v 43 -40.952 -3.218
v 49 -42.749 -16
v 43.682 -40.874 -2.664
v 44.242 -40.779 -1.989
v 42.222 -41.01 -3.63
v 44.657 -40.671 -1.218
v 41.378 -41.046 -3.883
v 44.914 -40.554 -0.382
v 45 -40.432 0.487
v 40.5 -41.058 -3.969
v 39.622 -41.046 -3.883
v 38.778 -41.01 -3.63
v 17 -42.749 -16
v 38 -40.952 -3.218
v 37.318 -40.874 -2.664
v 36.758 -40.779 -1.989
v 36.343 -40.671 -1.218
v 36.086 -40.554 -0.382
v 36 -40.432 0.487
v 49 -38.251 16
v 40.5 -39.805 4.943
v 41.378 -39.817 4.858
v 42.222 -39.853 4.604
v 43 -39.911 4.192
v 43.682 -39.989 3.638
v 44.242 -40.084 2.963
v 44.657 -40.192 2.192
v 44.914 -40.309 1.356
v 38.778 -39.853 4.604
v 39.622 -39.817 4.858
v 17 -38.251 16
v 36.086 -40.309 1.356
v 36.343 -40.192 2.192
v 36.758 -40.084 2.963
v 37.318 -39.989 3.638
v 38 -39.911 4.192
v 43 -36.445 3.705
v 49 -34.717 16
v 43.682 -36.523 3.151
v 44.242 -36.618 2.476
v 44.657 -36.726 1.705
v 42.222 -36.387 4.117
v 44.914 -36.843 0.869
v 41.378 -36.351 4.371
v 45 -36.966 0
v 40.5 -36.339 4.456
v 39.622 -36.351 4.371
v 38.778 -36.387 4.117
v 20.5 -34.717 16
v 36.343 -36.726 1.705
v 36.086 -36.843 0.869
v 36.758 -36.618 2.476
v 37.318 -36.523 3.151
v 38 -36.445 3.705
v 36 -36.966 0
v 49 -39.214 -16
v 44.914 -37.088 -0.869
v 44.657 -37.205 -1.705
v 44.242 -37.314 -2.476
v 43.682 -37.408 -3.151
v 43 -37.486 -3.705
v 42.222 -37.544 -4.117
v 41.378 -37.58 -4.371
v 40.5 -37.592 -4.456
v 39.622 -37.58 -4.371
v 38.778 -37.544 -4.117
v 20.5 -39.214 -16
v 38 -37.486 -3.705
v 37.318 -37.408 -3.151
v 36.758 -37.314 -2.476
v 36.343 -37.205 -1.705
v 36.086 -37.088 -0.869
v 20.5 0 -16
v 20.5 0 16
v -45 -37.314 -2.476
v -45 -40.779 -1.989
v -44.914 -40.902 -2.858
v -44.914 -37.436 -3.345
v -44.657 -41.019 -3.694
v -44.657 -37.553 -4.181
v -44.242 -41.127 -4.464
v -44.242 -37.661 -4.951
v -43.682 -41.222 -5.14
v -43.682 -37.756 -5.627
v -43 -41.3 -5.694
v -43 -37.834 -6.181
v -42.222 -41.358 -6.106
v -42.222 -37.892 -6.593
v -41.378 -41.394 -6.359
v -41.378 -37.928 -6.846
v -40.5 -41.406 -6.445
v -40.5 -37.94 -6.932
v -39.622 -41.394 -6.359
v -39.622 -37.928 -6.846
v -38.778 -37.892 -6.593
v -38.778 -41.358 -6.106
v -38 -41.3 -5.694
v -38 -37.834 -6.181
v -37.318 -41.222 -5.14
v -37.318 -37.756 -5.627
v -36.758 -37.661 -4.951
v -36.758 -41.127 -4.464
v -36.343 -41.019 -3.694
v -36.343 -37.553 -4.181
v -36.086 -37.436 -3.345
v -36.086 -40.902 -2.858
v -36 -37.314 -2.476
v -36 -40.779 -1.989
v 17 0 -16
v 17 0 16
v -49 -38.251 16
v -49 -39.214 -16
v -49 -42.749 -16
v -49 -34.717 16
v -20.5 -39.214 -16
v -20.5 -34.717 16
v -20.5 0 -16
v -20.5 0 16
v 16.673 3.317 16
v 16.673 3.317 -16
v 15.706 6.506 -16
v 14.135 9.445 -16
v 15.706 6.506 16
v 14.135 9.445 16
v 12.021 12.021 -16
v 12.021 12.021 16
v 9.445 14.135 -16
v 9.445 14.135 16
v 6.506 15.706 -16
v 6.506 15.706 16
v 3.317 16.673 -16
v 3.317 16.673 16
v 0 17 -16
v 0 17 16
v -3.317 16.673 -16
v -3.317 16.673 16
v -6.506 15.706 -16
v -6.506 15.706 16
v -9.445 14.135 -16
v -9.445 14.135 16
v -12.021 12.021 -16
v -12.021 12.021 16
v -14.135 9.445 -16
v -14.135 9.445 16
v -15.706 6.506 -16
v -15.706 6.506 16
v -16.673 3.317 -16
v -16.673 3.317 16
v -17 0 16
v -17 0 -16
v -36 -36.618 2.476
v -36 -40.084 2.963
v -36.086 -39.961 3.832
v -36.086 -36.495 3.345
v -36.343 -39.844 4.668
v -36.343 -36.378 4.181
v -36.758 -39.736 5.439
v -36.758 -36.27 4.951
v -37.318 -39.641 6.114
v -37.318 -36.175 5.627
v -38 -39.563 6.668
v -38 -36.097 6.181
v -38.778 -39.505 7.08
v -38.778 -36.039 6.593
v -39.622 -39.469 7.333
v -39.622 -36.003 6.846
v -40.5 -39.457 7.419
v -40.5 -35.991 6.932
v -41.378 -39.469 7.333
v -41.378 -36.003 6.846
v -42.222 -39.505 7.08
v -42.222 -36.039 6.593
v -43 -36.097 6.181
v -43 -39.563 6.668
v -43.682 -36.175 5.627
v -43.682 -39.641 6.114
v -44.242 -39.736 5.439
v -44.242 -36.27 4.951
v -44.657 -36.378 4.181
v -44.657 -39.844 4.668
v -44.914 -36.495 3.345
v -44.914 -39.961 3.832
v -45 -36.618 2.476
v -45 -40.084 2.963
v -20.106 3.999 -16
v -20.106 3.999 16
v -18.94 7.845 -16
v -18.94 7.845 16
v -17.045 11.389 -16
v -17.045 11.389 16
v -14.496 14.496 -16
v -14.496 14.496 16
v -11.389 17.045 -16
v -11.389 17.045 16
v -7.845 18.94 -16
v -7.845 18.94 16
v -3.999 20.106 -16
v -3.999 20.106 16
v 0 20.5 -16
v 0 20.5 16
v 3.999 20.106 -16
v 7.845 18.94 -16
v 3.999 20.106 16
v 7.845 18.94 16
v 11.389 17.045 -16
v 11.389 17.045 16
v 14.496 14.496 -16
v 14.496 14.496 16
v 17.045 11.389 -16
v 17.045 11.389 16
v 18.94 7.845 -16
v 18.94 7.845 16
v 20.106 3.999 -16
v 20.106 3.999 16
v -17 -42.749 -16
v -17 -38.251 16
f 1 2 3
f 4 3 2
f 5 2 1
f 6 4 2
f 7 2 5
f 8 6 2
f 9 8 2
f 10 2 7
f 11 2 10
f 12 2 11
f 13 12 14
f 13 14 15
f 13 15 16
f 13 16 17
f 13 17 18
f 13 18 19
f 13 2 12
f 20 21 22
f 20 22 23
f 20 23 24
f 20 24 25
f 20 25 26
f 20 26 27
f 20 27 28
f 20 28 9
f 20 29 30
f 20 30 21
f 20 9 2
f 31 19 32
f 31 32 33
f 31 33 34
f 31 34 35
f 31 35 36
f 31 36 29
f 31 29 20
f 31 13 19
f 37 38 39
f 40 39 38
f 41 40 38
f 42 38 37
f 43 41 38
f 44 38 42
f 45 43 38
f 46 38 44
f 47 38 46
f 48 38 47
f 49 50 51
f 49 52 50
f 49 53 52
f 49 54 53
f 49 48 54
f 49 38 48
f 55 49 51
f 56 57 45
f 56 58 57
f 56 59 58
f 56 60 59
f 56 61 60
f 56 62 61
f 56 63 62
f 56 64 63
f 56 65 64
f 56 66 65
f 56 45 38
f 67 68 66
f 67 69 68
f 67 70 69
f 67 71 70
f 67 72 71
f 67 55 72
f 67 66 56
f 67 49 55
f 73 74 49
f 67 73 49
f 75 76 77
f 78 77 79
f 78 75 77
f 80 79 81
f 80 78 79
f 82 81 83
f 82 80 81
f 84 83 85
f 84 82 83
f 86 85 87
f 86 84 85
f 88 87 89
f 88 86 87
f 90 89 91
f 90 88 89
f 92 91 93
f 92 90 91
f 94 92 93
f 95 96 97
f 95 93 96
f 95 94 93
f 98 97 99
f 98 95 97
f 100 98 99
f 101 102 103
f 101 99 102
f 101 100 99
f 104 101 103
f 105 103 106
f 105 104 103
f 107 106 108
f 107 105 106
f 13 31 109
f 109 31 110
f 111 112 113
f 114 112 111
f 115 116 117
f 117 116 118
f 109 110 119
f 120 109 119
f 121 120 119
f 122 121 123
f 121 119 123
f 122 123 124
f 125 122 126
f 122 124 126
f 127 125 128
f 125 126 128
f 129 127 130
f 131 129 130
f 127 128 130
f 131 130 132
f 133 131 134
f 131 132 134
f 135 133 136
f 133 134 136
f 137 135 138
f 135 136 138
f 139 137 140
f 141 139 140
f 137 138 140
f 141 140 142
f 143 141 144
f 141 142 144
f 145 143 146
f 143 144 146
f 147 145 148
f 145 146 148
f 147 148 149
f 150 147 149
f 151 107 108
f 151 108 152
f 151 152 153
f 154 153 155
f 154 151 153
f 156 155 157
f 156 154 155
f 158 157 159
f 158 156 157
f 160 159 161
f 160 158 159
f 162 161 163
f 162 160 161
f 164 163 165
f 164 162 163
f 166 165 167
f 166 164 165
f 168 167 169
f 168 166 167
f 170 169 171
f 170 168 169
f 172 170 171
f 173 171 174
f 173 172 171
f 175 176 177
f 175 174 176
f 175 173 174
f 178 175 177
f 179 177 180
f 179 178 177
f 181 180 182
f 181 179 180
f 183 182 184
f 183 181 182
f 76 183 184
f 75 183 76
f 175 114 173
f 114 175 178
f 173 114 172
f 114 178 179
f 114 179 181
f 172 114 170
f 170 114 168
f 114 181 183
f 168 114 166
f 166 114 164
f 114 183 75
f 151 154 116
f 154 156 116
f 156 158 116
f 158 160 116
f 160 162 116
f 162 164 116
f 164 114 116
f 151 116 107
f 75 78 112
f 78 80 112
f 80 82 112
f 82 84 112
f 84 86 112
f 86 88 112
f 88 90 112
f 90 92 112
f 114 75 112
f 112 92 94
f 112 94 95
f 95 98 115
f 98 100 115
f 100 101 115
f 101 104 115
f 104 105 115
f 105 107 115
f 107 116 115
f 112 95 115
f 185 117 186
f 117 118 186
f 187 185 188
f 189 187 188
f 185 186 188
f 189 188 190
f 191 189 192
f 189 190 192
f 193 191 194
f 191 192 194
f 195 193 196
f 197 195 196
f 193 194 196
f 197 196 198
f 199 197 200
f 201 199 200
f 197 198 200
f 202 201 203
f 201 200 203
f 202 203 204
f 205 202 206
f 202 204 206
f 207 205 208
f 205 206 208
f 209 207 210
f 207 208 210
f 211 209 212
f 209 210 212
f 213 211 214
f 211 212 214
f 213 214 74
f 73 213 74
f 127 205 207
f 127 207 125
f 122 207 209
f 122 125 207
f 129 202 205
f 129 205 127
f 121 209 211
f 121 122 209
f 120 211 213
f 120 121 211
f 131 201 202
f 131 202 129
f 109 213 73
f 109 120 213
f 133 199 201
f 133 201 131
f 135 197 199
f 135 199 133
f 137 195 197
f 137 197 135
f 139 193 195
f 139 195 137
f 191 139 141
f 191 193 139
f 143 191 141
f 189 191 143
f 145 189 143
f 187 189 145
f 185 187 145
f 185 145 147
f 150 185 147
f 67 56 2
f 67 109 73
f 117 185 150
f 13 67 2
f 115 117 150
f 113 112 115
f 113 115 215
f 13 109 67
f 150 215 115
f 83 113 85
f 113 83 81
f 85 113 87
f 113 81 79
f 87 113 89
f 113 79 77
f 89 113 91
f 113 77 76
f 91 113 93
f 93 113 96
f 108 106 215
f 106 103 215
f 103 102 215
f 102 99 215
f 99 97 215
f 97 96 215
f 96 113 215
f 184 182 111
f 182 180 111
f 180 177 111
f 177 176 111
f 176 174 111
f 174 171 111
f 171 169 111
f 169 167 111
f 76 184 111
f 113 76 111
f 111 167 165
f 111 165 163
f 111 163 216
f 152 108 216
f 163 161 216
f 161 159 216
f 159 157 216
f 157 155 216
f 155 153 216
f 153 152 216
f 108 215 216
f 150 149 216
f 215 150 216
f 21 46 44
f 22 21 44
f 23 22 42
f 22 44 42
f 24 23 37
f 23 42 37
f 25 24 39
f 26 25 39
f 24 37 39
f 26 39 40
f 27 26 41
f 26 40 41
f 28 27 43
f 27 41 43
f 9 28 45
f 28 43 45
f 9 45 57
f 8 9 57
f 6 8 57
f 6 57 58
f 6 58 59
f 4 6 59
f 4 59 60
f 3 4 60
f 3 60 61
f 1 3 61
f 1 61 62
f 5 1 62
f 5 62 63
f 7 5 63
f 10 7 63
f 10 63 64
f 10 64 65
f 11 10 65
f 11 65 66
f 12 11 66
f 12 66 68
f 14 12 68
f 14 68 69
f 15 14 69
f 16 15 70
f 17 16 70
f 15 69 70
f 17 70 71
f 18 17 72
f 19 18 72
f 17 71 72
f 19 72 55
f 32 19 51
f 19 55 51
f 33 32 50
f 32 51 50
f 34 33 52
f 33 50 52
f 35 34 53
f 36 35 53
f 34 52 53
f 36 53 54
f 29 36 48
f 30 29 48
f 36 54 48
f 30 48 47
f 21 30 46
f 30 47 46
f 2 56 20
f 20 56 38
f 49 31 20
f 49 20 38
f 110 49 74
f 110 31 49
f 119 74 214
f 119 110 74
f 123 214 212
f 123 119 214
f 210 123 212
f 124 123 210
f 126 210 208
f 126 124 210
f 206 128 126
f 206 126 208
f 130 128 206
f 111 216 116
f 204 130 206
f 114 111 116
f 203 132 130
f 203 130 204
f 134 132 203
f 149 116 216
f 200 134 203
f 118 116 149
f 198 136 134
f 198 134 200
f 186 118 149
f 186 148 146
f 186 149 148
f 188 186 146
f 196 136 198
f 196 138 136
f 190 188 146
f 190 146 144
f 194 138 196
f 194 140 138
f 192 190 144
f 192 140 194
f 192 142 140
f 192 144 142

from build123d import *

# Parameters (mm, degrees)
EXTRUDE_1_DEPTH     = 16
CUT_EXTRUDE_1_DEPTH = 50
EXTRUDE_2_DEPTH     = 28.5
SKETCH_4_R          = 4.5
CUT_EXTRUDE_2_DEPTH = 28.5


with BuildPart() as part:
    # 草图1 → 凸台-拉伸1 (new, symmetric)
    with BuildSketch(Plane.XY):
        with BuildLine():
            Line((-17, 0), (-17, -66.86388681))
            Line((-17, -66.86388681), (-20.5, -66.86388681))
            Line((-20.5, -66.86388681), (-20.5, 0))
            ThreePointArc((-20.5, 0), (0, 20.5), (20.5, 0))
            Line((20.5, 0), (20.5, -66.86388681))
            Line((20.5, -66.86388681), (17, -66.86388681))
            Line((17, -66.86388681), (17, 0))
            ThreePointArc((17, 0), (0, 17), (-17, 0))
        make_face()
    extrude(amount=EXTRUDE_1_DEPTH, both=True)

    # 草图2 → 切除-拉伸1 (cut, symmetric)
    with BuildSketch(Plane(origin=(0, 0, 0), x_dir=(0, 0, -1), z_dir=(1, 0, 0))):
        Polygon((16, -42.748653355), (-16, -38.251346645), (-16, -66.86388681), (16, -66.86388681), align=None)
    extrude(amount=CUT_EXTRUDE_1_DEPTH, both=True, mode=Mode.SUBTRACT)

    # 草图3 → 凸台-拉伸2 (add)
    with BuildSketch(Plane.ZY.offset(20.5)):
        Polygon((-16, -42.748653355), (16, -38.251346645), (16, -34.716950141), (-16, -39.214256851), align=None)
    extrude_2 = extrude(amount=EXTRUDE_2_DEPTH)

    # 镜向1: 凸台-拉伸2 across plane
    add(extrude_2.mirror(Plane(origin=(0, 0, 0), x_dir=(0, 0, 1), z_dir=(1, 0, 0))))

    # 草图4 → 切除-拉伸2 (cut)
    with BuildSketch(Plane(origin=(0, -36.249611102, 5.094550602), x_dir=(1, 0, 0), z_dir=(0, 0.9902680687415715, -0.13917310096005808))):
        with Locations(Location((40.5, 5.144617667, 0), (0, 0, 270))):
            Circle(SKETCH_4_R)
        with BuildLine():
            Line((-36, 7.644617667), (-36, 2.644617667))
            ThreePointArc((-36, 2.644617667), (-40.5, -1.855382333), (-45, 2.644617667))
            Line((-45, 2.644617667), (-45, 7.644617667))
            ThreePointArc((-45, 7.644617667), (-40.5, 12.144617667), (-36, 7.644617667))
        make_face()
    extrude(amount=-CUT_EXTRUDE_2_DEPTH, mode=Mode.SUBTRACT)


solid = part.part
